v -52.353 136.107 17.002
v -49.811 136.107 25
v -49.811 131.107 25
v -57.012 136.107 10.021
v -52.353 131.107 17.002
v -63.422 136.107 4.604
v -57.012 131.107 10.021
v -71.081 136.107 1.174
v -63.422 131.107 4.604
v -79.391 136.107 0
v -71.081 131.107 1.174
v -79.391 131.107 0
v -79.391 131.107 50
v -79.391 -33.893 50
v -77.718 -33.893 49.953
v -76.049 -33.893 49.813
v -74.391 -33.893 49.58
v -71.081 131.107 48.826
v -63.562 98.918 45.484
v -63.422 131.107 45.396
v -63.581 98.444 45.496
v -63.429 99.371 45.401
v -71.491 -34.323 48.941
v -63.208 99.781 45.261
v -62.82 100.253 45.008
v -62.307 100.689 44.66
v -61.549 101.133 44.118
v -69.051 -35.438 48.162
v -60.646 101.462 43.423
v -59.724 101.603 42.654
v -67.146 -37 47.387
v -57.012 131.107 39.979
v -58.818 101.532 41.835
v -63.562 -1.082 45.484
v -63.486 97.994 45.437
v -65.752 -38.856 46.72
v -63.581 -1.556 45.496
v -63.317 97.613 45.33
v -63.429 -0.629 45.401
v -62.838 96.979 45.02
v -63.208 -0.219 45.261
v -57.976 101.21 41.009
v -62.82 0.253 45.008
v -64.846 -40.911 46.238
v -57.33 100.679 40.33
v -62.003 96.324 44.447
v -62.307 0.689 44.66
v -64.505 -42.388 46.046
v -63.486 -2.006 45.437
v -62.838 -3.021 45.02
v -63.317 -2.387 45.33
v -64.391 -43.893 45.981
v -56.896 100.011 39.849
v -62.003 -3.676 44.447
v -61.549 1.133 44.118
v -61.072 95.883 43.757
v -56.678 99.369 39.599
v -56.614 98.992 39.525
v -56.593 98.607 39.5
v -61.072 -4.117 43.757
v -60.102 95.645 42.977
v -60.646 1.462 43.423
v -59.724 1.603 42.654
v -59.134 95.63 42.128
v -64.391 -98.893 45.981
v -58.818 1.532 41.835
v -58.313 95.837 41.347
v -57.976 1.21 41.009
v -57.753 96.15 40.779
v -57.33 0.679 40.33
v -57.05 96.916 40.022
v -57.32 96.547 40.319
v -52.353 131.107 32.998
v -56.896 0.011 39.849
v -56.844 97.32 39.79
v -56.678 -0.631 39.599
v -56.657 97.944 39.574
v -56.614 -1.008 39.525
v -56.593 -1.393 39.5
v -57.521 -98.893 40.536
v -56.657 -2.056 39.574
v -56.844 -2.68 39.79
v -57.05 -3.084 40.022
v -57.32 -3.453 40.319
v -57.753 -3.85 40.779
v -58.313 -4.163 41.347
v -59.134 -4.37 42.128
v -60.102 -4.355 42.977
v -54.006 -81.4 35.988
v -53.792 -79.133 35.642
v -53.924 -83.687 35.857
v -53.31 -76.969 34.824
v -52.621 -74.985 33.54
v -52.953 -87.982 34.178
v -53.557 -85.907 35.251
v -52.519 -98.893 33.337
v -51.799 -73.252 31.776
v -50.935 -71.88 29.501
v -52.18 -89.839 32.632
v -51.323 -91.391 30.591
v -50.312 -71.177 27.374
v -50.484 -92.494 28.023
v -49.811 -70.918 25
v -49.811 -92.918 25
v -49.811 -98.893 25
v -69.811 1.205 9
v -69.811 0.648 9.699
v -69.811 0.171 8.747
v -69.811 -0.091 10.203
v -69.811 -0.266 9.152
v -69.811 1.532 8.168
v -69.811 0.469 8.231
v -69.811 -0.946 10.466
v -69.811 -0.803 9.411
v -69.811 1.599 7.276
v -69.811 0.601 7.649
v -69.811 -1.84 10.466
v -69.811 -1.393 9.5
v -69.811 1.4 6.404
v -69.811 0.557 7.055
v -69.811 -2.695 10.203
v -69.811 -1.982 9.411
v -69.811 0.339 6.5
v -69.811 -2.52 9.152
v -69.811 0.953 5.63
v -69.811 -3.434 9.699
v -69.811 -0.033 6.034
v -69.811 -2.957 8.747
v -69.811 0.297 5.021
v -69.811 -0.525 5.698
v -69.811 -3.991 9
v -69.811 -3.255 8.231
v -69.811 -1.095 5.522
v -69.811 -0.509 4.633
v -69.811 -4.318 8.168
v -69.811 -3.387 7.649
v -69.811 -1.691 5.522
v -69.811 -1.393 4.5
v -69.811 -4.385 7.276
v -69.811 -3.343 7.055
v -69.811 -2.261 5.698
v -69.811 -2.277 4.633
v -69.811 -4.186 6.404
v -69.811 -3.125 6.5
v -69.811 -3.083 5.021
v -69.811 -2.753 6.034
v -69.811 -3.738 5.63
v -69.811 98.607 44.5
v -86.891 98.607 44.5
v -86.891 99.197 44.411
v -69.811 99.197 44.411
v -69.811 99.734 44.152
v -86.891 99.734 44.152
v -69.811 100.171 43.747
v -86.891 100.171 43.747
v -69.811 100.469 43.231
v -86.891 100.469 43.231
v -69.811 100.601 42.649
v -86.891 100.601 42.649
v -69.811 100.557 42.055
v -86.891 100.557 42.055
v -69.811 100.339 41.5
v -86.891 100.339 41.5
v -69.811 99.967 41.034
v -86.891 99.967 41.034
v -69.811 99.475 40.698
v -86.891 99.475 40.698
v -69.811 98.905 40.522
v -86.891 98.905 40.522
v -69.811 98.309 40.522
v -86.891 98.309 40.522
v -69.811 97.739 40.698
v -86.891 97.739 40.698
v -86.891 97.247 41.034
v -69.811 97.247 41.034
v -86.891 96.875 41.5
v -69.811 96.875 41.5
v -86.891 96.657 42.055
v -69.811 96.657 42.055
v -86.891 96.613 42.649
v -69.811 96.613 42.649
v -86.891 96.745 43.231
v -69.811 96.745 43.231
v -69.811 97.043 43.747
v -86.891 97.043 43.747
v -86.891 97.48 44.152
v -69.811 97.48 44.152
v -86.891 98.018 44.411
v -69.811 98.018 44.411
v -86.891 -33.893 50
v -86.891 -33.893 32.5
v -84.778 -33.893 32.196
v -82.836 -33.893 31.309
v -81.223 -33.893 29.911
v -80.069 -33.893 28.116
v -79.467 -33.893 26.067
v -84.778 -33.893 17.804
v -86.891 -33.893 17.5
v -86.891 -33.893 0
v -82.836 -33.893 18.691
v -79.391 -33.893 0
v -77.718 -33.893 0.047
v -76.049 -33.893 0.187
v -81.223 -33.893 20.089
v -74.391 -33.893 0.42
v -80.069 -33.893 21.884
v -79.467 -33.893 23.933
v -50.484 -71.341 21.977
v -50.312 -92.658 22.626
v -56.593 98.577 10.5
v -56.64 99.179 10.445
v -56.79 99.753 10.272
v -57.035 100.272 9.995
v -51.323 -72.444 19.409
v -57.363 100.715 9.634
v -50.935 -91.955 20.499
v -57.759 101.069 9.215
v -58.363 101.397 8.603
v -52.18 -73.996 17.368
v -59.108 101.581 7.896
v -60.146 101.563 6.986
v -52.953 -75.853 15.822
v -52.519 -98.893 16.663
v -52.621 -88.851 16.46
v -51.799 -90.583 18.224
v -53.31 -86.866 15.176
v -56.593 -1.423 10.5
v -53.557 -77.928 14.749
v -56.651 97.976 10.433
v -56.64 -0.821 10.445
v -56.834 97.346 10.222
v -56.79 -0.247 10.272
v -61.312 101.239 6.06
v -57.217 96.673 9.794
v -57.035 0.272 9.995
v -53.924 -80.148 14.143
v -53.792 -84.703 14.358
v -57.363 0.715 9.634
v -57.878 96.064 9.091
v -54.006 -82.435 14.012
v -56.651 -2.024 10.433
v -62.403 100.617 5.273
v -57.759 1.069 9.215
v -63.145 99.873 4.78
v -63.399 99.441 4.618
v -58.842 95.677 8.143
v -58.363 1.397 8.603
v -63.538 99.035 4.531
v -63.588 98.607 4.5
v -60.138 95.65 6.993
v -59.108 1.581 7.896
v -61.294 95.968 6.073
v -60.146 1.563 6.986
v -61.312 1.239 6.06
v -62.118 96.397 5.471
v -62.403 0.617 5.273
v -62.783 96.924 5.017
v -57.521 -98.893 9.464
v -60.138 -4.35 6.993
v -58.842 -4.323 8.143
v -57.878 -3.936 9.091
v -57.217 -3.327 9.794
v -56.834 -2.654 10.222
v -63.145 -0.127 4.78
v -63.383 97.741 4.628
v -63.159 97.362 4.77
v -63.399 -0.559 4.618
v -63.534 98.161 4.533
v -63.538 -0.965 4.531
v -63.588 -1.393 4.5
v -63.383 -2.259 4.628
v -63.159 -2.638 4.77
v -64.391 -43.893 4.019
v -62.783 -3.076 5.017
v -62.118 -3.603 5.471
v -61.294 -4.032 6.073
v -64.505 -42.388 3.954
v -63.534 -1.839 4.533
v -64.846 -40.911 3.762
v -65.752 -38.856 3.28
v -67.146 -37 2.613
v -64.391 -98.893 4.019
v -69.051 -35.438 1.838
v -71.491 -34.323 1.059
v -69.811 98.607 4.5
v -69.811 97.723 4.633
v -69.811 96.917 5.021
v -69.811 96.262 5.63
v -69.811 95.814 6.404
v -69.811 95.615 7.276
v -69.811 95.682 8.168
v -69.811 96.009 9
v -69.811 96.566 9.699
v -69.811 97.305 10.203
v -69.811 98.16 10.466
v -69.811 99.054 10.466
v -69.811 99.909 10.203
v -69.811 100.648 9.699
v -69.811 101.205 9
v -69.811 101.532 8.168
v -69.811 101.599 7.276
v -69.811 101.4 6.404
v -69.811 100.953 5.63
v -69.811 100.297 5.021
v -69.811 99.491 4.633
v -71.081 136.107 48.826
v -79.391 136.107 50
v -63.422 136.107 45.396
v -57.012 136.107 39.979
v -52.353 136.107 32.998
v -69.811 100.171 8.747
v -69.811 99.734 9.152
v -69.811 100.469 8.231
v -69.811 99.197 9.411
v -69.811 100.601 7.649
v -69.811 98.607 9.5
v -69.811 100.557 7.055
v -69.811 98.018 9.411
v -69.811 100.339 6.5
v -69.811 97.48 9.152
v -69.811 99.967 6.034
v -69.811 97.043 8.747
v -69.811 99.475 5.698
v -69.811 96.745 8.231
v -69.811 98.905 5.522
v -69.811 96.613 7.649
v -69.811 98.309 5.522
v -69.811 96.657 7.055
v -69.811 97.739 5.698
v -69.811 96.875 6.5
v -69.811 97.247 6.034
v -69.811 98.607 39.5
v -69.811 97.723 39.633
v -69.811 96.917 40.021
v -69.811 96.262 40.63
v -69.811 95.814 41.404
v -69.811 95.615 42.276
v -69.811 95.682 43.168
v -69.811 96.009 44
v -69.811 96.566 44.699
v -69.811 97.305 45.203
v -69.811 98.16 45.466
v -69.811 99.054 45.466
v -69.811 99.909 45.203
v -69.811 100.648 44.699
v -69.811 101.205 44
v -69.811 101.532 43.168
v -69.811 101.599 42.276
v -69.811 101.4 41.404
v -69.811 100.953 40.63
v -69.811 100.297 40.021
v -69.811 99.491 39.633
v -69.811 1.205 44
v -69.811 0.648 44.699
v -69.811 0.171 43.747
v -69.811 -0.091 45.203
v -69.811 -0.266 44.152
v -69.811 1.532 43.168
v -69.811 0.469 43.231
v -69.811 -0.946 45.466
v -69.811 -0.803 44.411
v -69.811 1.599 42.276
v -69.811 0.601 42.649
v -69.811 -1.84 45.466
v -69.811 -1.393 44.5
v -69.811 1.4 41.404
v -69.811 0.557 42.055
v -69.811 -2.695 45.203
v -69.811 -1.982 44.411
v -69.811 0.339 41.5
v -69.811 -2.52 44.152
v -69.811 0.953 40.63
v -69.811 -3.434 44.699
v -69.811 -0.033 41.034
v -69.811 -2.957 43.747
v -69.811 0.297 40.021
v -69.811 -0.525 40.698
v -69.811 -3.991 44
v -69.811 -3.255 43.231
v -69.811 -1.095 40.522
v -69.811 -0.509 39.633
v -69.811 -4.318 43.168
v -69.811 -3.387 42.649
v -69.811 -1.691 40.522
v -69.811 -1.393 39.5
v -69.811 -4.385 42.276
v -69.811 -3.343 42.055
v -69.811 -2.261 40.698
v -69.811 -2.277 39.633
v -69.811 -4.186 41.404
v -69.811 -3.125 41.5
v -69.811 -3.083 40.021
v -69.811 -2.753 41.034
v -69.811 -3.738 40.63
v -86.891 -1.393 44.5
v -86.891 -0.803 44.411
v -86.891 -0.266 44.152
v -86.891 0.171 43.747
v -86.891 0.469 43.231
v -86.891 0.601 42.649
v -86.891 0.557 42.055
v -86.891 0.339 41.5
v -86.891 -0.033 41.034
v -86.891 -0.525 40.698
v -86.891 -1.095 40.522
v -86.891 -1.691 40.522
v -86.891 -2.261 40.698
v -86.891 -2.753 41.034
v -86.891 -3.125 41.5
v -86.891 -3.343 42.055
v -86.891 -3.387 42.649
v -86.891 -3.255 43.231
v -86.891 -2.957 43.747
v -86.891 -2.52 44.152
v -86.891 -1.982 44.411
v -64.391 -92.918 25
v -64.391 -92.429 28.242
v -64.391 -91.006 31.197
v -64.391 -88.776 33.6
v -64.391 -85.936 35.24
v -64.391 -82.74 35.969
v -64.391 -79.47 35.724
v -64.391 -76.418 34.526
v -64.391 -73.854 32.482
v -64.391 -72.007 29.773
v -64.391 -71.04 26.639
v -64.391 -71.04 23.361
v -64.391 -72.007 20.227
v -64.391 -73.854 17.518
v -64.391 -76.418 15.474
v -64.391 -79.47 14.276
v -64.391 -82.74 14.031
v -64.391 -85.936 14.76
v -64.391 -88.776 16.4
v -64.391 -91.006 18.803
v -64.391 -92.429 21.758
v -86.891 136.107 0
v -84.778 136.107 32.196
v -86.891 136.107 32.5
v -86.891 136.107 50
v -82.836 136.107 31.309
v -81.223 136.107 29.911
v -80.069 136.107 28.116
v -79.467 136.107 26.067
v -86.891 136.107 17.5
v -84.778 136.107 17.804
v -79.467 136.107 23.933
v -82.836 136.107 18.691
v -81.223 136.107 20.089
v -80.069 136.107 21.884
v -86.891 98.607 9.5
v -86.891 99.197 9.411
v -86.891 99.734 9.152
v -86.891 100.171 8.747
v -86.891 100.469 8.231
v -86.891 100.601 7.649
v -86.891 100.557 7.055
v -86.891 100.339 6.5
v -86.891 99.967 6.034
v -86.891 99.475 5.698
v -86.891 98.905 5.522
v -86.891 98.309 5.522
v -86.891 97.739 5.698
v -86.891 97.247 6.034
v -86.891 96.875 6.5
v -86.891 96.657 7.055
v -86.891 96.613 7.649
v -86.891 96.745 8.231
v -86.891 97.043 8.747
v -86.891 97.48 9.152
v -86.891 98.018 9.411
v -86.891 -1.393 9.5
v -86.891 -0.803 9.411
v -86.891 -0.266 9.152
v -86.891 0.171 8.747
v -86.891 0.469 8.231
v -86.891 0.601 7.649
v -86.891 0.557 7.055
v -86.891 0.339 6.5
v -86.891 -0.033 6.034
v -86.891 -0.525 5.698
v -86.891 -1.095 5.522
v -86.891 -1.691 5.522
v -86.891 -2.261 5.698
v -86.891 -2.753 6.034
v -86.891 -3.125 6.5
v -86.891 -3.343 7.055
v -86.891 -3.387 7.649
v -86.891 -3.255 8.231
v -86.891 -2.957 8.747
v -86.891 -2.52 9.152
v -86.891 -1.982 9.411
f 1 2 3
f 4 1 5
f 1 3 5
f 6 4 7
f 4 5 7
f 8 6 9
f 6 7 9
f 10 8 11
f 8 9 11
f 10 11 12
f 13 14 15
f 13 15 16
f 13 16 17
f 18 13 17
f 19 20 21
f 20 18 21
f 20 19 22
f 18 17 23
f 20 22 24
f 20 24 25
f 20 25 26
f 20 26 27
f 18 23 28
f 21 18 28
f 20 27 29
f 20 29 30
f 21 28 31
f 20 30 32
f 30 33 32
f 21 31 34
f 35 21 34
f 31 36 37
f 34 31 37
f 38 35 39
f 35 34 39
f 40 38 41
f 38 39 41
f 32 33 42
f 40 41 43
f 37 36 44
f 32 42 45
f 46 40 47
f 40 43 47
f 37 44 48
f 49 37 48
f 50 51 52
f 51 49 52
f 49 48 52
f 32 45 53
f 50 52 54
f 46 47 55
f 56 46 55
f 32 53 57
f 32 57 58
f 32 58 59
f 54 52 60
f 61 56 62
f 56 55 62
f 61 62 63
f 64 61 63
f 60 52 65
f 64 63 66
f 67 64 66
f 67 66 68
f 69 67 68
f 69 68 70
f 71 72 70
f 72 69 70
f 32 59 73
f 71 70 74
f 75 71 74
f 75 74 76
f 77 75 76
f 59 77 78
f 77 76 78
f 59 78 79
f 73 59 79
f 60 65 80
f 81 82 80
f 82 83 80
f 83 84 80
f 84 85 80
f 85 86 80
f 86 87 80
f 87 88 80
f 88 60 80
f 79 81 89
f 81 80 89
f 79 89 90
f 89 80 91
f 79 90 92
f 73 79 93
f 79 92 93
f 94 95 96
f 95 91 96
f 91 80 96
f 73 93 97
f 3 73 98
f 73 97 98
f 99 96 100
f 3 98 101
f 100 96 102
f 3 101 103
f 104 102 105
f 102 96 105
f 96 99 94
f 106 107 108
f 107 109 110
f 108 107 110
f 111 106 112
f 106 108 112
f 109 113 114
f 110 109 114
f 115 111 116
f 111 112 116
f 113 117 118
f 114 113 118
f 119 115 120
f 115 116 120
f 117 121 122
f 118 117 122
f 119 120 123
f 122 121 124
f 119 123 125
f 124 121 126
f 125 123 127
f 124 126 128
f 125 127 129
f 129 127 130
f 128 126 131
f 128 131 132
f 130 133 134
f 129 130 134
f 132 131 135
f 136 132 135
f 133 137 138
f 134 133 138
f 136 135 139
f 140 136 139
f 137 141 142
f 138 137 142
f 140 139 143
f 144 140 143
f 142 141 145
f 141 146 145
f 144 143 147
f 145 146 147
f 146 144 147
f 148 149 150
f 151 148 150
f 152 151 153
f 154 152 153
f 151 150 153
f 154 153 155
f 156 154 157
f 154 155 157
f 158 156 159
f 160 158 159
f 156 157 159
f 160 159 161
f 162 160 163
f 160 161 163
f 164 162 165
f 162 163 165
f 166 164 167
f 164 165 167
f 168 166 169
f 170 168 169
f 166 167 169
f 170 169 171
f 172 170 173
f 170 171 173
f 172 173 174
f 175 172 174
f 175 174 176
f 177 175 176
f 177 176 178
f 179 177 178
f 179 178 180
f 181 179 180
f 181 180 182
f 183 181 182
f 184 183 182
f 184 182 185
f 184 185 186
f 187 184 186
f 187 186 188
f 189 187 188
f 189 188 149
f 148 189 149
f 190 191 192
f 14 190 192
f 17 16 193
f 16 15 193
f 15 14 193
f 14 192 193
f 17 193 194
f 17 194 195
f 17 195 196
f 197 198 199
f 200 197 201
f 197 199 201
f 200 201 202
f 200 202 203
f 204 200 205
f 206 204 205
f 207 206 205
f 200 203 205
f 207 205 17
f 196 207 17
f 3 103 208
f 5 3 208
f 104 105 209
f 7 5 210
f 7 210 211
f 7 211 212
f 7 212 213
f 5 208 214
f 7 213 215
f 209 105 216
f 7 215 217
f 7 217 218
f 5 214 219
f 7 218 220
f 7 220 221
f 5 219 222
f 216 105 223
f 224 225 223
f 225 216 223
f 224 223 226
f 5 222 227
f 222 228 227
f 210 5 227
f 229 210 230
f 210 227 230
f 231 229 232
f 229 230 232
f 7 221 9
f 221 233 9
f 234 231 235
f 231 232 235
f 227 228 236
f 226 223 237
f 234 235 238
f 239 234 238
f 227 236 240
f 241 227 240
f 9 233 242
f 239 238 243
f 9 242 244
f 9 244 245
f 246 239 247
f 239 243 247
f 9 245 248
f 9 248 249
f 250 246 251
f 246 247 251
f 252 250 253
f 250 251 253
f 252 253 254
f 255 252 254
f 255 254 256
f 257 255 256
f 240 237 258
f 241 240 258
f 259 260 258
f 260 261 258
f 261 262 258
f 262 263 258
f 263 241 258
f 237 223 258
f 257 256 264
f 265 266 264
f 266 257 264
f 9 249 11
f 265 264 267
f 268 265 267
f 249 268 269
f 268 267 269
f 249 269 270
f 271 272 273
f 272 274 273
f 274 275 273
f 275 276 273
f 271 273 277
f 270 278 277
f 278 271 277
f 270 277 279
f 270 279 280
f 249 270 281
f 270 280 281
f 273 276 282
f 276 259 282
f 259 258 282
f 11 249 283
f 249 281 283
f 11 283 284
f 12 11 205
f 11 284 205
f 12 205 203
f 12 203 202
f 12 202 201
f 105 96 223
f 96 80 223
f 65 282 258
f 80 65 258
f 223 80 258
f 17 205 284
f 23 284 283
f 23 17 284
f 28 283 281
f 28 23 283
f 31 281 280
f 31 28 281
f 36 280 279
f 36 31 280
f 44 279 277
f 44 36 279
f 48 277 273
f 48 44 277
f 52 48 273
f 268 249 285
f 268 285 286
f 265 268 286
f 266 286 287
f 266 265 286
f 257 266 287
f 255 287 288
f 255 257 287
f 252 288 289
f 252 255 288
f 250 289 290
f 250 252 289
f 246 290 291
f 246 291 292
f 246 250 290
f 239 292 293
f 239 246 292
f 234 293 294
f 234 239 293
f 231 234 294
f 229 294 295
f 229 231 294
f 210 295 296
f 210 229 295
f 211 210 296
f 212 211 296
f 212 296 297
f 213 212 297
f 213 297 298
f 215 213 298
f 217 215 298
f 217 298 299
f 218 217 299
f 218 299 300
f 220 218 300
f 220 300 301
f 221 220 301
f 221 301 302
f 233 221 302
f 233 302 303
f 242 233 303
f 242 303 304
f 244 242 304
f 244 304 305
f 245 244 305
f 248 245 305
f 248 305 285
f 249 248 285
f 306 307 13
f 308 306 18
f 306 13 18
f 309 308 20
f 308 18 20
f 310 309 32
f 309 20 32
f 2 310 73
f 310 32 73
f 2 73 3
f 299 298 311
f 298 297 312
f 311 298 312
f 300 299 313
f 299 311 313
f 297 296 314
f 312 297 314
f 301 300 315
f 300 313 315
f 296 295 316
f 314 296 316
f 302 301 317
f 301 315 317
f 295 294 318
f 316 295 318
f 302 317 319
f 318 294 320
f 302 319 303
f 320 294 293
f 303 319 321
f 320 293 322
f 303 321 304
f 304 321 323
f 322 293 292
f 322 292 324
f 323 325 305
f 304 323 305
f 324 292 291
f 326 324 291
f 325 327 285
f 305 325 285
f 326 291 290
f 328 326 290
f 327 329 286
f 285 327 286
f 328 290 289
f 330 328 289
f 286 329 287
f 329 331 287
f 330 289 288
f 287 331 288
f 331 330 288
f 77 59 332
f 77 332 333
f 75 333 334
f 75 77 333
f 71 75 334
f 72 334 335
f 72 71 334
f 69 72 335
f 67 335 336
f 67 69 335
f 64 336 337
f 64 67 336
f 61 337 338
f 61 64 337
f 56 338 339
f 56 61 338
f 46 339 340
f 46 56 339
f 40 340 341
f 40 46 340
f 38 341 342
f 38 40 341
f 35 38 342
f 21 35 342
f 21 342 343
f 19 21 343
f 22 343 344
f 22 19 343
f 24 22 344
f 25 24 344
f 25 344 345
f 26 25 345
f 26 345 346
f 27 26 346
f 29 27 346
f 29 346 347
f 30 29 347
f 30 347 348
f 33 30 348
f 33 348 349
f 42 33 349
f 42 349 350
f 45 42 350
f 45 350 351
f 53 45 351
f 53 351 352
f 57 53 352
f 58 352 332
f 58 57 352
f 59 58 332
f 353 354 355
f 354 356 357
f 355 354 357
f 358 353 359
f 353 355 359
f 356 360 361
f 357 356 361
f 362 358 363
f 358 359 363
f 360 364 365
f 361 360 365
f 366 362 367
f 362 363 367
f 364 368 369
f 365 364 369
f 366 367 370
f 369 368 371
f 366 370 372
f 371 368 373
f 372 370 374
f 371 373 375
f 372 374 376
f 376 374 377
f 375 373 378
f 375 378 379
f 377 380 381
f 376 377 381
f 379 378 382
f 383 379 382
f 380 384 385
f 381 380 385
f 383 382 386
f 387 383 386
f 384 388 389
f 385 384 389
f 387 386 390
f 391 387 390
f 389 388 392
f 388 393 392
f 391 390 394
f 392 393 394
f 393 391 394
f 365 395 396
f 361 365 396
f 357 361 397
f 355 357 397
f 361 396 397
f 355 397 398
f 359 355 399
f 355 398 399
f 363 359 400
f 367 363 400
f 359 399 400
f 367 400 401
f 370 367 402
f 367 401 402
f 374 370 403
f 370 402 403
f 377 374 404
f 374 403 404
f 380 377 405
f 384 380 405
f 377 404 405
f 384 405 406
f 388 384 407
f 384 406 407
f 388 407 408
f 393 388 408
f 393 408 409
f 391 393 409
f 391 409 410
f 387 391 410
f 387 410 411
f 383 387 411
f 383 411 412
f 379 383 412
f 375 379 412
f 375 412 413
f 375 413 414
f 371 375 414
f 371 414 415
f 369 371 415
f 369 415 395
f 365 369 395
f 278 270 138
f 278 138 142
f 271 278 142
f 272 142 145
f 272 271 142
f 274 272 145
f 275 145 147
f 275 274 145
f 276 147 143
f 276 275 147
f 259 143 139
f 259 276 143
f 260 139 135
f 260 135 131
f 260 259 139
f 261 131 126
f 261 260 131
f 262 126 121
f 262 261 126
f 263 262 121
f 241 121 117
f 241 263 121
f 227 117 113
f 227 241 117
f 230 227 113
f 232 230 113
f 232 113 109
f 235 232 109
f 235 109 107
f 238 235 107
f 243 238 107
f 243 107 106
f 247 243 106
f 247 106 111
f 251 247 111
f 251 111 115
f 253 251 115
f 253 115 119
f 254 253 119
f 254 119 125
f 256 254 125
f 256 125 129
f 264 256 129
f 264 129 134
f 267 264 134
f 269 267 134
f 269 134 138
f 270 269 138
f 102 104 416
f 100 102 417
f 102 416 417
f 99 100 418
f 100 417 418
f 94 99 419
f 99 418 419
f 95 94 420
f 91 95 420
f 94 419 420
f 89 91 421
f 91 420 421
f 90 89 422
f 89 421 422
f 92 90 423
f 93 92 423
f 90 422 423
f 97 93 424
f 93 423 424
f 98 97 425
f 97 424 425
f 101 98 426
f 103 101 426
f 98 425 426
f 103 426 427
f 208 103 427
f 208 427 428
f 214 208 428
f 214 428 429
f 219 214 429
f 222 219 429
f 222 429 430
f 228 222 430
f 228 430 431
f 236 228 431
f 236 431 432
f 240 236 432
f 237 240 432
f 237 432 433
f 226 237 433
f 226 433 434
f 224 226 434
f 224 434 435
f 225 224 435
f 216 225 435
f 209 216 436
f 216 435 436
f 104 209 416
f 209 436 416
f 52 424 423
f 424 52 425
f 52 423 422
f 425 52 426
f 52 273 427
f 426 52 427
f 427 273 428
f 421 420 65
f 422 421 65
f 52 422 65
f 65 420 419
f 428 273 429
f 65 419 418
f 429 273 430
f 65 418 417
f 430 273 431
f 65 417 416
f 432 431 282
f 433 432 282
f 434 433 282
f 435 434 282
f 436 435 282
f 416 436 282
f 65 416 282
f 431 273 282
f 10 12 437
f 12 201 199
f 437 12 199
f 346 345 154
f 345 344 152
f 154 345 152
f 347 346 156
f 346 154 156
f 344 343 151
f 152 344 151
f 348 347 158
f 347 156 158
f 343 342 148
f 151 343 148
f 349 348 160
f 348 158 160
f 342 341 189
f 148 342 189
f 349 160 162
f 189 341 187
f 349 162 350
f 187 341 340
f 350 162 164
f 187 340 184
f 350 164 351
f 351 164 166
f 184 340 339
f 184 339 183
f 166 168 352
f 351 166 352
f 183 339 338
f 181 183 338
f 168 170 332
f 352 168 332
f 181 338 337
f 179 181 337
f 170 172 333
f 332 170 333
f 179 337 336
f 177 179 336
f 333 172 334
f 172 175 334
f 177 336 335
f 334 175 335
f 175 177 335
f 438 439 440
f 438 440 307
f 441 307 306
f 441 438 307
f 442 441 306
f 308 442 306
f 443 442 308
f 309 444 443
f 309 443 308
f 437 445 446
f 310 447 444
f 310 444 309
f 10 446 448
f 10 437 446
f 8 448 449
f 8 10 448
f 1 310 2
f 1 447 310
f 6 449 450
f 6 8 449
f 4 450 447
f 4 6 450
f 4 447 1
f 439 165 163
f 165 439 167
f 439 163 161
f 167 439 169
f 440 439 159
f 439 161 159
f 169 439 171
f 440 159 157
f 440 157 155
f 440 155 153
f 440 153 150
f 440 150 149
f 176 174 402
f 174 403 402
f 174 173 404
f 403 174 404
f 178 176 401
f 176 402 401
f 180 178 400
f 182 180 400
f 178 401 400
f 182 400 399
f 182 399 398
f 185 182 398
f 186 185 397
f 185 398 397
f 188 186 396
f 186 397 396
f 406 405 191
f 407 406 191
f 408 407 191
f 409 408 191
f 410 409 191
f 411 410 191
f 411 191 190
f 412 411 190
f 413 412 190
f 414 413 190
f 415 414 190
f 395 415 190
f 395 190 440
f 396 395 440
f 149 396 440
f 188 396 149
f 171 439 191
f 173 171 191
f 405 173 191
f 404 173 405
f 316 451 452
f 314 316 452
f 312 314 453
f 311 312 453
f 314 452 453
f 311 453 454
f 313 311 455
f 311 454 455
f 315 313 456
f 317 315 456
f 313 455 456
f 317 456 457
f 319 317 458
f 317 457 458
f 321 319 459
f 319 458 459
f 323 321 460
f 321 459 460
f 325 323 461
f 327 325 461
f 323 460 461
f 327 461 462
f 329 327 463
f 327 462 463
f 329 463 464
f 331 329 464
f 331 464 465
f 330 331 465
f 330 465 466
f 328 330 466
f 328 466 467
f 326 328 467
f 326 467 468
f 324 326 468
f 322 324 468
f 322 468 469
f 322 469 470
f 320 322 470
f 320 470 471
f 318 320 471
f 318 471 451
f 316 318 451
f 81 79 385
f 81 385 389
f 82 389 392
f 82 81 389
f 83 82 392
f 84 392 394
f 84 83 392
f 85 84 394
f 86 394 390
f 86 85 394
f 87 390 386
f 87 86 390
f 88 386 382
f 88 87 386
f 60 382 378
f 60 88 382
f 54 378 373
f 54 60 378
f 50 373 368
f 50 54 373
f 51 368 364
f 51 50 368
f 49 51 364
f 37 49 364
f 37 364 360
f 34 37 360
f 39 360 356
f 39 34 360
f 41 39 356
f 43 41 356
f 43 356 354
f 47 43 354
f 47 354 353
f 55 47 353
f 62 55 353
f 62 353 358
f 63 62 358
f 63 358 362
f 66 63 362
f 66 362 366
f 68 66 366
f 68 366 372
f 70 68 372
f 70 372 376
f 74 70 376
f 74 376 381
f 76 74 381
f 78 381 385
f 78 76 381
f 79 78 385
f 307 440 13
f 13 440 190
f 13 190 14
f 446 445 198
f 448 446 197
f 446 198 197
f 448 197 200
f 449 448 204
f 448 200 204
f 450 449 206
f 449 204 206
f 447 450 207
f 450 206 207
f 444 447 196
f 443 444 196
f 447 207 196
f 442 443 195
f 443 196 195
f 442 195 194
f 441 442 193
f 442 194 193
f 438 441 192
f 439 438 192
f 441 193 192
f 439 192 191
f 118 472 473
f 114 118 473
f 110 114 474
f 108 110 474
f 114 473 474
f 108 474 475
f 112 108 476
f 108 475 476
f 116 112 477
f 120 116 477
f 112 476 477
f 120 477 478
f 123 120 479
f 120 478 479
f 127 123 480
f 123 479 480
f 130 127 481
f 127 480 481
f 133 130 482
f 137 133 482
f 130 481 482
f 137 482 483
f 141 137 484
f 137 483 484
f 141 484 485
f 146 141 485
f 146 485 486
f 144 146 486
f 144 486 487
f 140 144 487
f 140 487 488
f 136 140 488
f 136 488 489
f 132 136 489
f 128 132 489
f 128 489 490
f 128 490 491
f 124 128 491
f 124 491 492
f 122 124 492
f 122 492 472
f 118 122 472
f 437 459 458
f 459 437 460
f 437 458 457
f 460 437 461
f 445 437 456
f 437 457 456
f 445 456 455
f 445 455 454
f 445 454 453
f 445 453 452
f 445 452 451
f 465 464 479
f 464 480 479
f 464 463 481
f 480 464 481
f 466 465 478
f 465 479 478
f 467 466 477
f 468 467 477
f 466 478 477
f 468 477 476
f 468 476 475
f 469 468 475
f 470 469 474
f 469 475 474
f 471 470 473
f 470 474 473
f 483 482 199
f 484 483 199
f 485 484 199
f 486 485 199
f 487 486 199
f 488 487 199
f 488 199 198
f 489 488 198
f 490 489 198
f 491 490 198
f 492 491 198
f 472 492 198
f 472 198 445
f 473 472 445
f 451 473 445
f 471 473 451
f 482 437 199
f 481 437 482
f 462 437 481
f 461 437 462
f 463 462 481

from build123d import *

# Parameters (mm, degrees)
BOSS_EXTRU_1_DEPTH            = 50
CONG_4_R                      = 35
CONG_5_R                      = 35
CONG_6_R                      = 30
CONG_12_R                     = 10
ESQUISSE3_R                   = 11
ENL_V_MAT_EXTRU_4_DEPTH       = 50
ENL_V_MAT_EXTRU_8_DEPTH       = 251
ESQUISSE6_R                   = 2
ENL_V_MAT_EXTRU_9_DEPTH       = 58
ENL_V_MAT_EXTRU_12_DEPTH      = 251.898527225
ENL_V_MAT_EXTRU_12_DEPTH_BACK = 179
ESQUISSE11_R                  = 3
ENL_V_MAT_EXTRU_14_DEPTH      = 20
BOSS_EXTRU_2_DEPTH            = 5


with BuildPart() as part:
    # Esquisse1 → Boss.-Extru.1 (new body)
    with BuildSketch(Plane.XY):
        Polygon((-129.391143911, 131.10701107), (-129.391143911, -98.89298893), (-124.391143911, -98.89298893), (-124.391143911, -33.89298893), (-64.391143911, -33.89298893), (-64.391143911, -98.89298893), (-49.391143911, -98.89298893), (-49.391143911, 131.10701107), align=None)
    extrude(amount=BOSS_EXTRU_1_DEPTH)

    # Congé4
    cong_4_edges = [part.edges().sort_by_distance(p)[0] for p in [
        (-129.391143911, 16.10701107, 50),
    ]]
    fillet(cong_4_edges, radius=CONG_4_R)

    # Congé5
    # the kernel refuses this fillet: 35 mm, written as the material it takes off along each edge
    with BuildSketch(Plane(origin=(-129.391143911, 202.914044152, 0), x_dir=(0, 0, 1), z_dir=(0, -1, 0))) as cong_5_piece_1:
        with BuildLine():
            CenterArc((35, -28.722813233), CONG_5_R, 124.849904579, 55.150095421)
            Line((0, -28.722813233), (-0.7, -28.722813233))
            Line((-0.7, -28.722813233), (-0.7, 0))
            Line((-0.7, 0), (0, 0.7))
            ThreePointArc((0, 0.7), (7.5, 0.7), (14.6, 0.574456265))
            Line((14.6, 0.574456265), (15, 0))
        make_face()
    extrude(amount=373.614066163, mode=Mode.SUBTRACT)

    # Congé6
    # the kernel refuses this fillet: 30 mm, written as the material it takes off along each edge
    with BuildSketch(Plane(origin=(-49.391143911, -173.89298893, 0), x_dir=(-1, 0, 0), z_dir=(0, 1, 0))) as cong_6_piece_1:
        with BuildLine():
            CenterArc((CONG_6_R, CONG_6_R), CONG_6_R, 180, 90)
            Line((0, CONG_6_R), (0, 0))
            Line((0, 0), (CONG_6_R, 0))
        make_face()
    extrude(amount=380, mode=Mode.SUBTRACT)
    with BuildSketch(Plane(origin=(-49.391143911, -173.89298893, 50), x_dir=(-1, 0, 0), z_dir=(0, 1, 0))) as cong_6_piece_2:
        with BuildLine():
            CenterArc((CONG_6_R, -CONG_6_R), CONG_6_R, 90, 90)
            Line((0, -CONG_6_R), (0, 0))
            Line((0, 0), (CONG_6_R, 0))
        make_face()
    extrude(amount=380, mode=Mode.SUBTRACT)

    # Congé12
    cong_12_edges = [part.edges().sort_by_distance(p)[0] for p in [
        (-124.391143911, -33.89298893, 21.146981396),
        (-64.391143911, -33.89298893, 25),
    ]]
    fillet(cong_12_edges, radius=CONG_12_R)

    # Esquisse3 → Enlèv. mat.-Extru.4 (cut)
    with BuildSketch(Plane.ZY.offset(64.391143911)):
        with Locations(Location((25, -81.917553746, 0), (0, 0, 270))):
            Circle(ESQUISSE3_R)
    extrude(amount=-ENL_V_MAT_EXTRU_4_DEPTH, mode=Mode.SUBTRACT)

    # Esquisse5 → Enlèv. mat.-Extru.8 (cut)
    with BuildSketch(Plane(origin=(0, 131.10701107, 0), x_dir=(1, 0, 0), z_dir=(0, 1, 0))):
        with BuildLine():
            Line((-86.891143911, -50), (-86.891143911, 0))
            ThreePointArc((-86.891143911, 0), (-162.141280076, -25), (-86.891143911, -50))
        make_face()
    extrude(amount=-ENL_V_MAT_EXTRU_8_DEPTH, mode=Mode.SUBTRACT)

    # Esquisse6 → Enlèv. mat.-Extru.9 (cut)
    with BuildSketch(Plane.ZY.offset(86.891143911)):
        with Locations((7.5, 98.60701107)):
            Circle(ESQUISSE6_R)
        with Locations((42.5, 98.60701107)):
            Circle(ESQUISSE6_R)
        with Locations((42.5, -1.39298893)):
            Circle(ESQUISSE6_R)
        with Locations((7.5, -1.39298893)):
            Circle(ESQUISSE6_R)
    extrude(amount=-ENL_V_MAT_EXTRU_9_DEPTH, mode=Mode.SUBTRACT)

    # Esquisse9 → Enlèv. mat.-Extru.12 (cut, two sides: drawn at the far end of the back side and taken through both)
    with BuildSketch(Plane(origin=(0, 131.10701107, 0), x_dir=(1, 0, 0), z_dir=(0, 1, 0)).offset(-ENL_V_MAT_EXTRU_12_DEPTH_BACK)):
        with BuildLine():
            Line((-195.505666121, -17.5), (-86.891143911, -17.5))
            ThreePointArc((-86.891143911, -17.5), (-79.391143911, -25), (-86.891143911, -32.5))
            Line((-86.891143911, -32.5), (-195.505666121, -32.5))
            Line((-195.505666121, -32.5), (-412.73471054, -32.5))
            Line((-412.73471054, -32.5), (-412.73471054, -17.5))
            Line((-412.73471054, -17.5), (-195.505666121, -17.5))
        make_face()
    extrude(amount=ENL_V_MAT_EXTRU_12_DEPTH + ENL_V_MAT_EXTRU_12_DEPTH_BACK, mode=Mode.SUBTRACT)

    # Esquisse11 → Enlèv. mat.-Extru.14 (cut)
    with BuildSketch(Plane.ZY.offset(49.810744996)):
        with Locations(Location((42.5, 98.60701107, 0), (0, 0, 180))):
            Circle(ESQUISSE11_R)
        with Locations(Location((7.5, 98.60701107, 0), (0, 0, 180))):
            Circle(ESQUISSE11_R)
        with Locations(Location((42.5, -1.39298893, 0), (0, 0, 180))):
            Circle(ESQUISSE11_R)
        with Locations(Location((7.5, -1.39298893, 0), (0, 0, 180))):
            Circle(ESQUISSE11_R)
    extrude(amount=ENL_V_MAT_EXTRU_14_DEPTH, mode=Mode.SUBTRACT)

    # Esquisse12 → Boss.-Extru.2 (add)
    with BuildSketch(Plane(origin=(0, 131.10701107, 0), x_dir=(1, 0, 0), z_dir=(0, 1, 0))):
        with BuildLine():
            Line((-79.391143911, 0), (-86.891143911, 0))
            Line((-86.891143911, 0), (-86.891143911, -17.5))
            ThreePointArc((-86.891143911, -17.5), (-79.391143911, -25), (-86.891143911, -32.5))
            Line((-86.891143911, -32.5), (-86.891143911, -50))
            Line((-86.891143911, -50), (-79.391143911, -50))
            ThreePointArc((-79.391143911, -50), (-60.02622718, -42.912878475), (-49.810744996, -25))
            ThreePointArc((-49.810744996, -25), (-60.02622718, -7.087121525), (-79.391143911, 0))
        make_face()
    extrude(amount=BOSS_EXTRU_2_DEPTH)


solid = part.part
